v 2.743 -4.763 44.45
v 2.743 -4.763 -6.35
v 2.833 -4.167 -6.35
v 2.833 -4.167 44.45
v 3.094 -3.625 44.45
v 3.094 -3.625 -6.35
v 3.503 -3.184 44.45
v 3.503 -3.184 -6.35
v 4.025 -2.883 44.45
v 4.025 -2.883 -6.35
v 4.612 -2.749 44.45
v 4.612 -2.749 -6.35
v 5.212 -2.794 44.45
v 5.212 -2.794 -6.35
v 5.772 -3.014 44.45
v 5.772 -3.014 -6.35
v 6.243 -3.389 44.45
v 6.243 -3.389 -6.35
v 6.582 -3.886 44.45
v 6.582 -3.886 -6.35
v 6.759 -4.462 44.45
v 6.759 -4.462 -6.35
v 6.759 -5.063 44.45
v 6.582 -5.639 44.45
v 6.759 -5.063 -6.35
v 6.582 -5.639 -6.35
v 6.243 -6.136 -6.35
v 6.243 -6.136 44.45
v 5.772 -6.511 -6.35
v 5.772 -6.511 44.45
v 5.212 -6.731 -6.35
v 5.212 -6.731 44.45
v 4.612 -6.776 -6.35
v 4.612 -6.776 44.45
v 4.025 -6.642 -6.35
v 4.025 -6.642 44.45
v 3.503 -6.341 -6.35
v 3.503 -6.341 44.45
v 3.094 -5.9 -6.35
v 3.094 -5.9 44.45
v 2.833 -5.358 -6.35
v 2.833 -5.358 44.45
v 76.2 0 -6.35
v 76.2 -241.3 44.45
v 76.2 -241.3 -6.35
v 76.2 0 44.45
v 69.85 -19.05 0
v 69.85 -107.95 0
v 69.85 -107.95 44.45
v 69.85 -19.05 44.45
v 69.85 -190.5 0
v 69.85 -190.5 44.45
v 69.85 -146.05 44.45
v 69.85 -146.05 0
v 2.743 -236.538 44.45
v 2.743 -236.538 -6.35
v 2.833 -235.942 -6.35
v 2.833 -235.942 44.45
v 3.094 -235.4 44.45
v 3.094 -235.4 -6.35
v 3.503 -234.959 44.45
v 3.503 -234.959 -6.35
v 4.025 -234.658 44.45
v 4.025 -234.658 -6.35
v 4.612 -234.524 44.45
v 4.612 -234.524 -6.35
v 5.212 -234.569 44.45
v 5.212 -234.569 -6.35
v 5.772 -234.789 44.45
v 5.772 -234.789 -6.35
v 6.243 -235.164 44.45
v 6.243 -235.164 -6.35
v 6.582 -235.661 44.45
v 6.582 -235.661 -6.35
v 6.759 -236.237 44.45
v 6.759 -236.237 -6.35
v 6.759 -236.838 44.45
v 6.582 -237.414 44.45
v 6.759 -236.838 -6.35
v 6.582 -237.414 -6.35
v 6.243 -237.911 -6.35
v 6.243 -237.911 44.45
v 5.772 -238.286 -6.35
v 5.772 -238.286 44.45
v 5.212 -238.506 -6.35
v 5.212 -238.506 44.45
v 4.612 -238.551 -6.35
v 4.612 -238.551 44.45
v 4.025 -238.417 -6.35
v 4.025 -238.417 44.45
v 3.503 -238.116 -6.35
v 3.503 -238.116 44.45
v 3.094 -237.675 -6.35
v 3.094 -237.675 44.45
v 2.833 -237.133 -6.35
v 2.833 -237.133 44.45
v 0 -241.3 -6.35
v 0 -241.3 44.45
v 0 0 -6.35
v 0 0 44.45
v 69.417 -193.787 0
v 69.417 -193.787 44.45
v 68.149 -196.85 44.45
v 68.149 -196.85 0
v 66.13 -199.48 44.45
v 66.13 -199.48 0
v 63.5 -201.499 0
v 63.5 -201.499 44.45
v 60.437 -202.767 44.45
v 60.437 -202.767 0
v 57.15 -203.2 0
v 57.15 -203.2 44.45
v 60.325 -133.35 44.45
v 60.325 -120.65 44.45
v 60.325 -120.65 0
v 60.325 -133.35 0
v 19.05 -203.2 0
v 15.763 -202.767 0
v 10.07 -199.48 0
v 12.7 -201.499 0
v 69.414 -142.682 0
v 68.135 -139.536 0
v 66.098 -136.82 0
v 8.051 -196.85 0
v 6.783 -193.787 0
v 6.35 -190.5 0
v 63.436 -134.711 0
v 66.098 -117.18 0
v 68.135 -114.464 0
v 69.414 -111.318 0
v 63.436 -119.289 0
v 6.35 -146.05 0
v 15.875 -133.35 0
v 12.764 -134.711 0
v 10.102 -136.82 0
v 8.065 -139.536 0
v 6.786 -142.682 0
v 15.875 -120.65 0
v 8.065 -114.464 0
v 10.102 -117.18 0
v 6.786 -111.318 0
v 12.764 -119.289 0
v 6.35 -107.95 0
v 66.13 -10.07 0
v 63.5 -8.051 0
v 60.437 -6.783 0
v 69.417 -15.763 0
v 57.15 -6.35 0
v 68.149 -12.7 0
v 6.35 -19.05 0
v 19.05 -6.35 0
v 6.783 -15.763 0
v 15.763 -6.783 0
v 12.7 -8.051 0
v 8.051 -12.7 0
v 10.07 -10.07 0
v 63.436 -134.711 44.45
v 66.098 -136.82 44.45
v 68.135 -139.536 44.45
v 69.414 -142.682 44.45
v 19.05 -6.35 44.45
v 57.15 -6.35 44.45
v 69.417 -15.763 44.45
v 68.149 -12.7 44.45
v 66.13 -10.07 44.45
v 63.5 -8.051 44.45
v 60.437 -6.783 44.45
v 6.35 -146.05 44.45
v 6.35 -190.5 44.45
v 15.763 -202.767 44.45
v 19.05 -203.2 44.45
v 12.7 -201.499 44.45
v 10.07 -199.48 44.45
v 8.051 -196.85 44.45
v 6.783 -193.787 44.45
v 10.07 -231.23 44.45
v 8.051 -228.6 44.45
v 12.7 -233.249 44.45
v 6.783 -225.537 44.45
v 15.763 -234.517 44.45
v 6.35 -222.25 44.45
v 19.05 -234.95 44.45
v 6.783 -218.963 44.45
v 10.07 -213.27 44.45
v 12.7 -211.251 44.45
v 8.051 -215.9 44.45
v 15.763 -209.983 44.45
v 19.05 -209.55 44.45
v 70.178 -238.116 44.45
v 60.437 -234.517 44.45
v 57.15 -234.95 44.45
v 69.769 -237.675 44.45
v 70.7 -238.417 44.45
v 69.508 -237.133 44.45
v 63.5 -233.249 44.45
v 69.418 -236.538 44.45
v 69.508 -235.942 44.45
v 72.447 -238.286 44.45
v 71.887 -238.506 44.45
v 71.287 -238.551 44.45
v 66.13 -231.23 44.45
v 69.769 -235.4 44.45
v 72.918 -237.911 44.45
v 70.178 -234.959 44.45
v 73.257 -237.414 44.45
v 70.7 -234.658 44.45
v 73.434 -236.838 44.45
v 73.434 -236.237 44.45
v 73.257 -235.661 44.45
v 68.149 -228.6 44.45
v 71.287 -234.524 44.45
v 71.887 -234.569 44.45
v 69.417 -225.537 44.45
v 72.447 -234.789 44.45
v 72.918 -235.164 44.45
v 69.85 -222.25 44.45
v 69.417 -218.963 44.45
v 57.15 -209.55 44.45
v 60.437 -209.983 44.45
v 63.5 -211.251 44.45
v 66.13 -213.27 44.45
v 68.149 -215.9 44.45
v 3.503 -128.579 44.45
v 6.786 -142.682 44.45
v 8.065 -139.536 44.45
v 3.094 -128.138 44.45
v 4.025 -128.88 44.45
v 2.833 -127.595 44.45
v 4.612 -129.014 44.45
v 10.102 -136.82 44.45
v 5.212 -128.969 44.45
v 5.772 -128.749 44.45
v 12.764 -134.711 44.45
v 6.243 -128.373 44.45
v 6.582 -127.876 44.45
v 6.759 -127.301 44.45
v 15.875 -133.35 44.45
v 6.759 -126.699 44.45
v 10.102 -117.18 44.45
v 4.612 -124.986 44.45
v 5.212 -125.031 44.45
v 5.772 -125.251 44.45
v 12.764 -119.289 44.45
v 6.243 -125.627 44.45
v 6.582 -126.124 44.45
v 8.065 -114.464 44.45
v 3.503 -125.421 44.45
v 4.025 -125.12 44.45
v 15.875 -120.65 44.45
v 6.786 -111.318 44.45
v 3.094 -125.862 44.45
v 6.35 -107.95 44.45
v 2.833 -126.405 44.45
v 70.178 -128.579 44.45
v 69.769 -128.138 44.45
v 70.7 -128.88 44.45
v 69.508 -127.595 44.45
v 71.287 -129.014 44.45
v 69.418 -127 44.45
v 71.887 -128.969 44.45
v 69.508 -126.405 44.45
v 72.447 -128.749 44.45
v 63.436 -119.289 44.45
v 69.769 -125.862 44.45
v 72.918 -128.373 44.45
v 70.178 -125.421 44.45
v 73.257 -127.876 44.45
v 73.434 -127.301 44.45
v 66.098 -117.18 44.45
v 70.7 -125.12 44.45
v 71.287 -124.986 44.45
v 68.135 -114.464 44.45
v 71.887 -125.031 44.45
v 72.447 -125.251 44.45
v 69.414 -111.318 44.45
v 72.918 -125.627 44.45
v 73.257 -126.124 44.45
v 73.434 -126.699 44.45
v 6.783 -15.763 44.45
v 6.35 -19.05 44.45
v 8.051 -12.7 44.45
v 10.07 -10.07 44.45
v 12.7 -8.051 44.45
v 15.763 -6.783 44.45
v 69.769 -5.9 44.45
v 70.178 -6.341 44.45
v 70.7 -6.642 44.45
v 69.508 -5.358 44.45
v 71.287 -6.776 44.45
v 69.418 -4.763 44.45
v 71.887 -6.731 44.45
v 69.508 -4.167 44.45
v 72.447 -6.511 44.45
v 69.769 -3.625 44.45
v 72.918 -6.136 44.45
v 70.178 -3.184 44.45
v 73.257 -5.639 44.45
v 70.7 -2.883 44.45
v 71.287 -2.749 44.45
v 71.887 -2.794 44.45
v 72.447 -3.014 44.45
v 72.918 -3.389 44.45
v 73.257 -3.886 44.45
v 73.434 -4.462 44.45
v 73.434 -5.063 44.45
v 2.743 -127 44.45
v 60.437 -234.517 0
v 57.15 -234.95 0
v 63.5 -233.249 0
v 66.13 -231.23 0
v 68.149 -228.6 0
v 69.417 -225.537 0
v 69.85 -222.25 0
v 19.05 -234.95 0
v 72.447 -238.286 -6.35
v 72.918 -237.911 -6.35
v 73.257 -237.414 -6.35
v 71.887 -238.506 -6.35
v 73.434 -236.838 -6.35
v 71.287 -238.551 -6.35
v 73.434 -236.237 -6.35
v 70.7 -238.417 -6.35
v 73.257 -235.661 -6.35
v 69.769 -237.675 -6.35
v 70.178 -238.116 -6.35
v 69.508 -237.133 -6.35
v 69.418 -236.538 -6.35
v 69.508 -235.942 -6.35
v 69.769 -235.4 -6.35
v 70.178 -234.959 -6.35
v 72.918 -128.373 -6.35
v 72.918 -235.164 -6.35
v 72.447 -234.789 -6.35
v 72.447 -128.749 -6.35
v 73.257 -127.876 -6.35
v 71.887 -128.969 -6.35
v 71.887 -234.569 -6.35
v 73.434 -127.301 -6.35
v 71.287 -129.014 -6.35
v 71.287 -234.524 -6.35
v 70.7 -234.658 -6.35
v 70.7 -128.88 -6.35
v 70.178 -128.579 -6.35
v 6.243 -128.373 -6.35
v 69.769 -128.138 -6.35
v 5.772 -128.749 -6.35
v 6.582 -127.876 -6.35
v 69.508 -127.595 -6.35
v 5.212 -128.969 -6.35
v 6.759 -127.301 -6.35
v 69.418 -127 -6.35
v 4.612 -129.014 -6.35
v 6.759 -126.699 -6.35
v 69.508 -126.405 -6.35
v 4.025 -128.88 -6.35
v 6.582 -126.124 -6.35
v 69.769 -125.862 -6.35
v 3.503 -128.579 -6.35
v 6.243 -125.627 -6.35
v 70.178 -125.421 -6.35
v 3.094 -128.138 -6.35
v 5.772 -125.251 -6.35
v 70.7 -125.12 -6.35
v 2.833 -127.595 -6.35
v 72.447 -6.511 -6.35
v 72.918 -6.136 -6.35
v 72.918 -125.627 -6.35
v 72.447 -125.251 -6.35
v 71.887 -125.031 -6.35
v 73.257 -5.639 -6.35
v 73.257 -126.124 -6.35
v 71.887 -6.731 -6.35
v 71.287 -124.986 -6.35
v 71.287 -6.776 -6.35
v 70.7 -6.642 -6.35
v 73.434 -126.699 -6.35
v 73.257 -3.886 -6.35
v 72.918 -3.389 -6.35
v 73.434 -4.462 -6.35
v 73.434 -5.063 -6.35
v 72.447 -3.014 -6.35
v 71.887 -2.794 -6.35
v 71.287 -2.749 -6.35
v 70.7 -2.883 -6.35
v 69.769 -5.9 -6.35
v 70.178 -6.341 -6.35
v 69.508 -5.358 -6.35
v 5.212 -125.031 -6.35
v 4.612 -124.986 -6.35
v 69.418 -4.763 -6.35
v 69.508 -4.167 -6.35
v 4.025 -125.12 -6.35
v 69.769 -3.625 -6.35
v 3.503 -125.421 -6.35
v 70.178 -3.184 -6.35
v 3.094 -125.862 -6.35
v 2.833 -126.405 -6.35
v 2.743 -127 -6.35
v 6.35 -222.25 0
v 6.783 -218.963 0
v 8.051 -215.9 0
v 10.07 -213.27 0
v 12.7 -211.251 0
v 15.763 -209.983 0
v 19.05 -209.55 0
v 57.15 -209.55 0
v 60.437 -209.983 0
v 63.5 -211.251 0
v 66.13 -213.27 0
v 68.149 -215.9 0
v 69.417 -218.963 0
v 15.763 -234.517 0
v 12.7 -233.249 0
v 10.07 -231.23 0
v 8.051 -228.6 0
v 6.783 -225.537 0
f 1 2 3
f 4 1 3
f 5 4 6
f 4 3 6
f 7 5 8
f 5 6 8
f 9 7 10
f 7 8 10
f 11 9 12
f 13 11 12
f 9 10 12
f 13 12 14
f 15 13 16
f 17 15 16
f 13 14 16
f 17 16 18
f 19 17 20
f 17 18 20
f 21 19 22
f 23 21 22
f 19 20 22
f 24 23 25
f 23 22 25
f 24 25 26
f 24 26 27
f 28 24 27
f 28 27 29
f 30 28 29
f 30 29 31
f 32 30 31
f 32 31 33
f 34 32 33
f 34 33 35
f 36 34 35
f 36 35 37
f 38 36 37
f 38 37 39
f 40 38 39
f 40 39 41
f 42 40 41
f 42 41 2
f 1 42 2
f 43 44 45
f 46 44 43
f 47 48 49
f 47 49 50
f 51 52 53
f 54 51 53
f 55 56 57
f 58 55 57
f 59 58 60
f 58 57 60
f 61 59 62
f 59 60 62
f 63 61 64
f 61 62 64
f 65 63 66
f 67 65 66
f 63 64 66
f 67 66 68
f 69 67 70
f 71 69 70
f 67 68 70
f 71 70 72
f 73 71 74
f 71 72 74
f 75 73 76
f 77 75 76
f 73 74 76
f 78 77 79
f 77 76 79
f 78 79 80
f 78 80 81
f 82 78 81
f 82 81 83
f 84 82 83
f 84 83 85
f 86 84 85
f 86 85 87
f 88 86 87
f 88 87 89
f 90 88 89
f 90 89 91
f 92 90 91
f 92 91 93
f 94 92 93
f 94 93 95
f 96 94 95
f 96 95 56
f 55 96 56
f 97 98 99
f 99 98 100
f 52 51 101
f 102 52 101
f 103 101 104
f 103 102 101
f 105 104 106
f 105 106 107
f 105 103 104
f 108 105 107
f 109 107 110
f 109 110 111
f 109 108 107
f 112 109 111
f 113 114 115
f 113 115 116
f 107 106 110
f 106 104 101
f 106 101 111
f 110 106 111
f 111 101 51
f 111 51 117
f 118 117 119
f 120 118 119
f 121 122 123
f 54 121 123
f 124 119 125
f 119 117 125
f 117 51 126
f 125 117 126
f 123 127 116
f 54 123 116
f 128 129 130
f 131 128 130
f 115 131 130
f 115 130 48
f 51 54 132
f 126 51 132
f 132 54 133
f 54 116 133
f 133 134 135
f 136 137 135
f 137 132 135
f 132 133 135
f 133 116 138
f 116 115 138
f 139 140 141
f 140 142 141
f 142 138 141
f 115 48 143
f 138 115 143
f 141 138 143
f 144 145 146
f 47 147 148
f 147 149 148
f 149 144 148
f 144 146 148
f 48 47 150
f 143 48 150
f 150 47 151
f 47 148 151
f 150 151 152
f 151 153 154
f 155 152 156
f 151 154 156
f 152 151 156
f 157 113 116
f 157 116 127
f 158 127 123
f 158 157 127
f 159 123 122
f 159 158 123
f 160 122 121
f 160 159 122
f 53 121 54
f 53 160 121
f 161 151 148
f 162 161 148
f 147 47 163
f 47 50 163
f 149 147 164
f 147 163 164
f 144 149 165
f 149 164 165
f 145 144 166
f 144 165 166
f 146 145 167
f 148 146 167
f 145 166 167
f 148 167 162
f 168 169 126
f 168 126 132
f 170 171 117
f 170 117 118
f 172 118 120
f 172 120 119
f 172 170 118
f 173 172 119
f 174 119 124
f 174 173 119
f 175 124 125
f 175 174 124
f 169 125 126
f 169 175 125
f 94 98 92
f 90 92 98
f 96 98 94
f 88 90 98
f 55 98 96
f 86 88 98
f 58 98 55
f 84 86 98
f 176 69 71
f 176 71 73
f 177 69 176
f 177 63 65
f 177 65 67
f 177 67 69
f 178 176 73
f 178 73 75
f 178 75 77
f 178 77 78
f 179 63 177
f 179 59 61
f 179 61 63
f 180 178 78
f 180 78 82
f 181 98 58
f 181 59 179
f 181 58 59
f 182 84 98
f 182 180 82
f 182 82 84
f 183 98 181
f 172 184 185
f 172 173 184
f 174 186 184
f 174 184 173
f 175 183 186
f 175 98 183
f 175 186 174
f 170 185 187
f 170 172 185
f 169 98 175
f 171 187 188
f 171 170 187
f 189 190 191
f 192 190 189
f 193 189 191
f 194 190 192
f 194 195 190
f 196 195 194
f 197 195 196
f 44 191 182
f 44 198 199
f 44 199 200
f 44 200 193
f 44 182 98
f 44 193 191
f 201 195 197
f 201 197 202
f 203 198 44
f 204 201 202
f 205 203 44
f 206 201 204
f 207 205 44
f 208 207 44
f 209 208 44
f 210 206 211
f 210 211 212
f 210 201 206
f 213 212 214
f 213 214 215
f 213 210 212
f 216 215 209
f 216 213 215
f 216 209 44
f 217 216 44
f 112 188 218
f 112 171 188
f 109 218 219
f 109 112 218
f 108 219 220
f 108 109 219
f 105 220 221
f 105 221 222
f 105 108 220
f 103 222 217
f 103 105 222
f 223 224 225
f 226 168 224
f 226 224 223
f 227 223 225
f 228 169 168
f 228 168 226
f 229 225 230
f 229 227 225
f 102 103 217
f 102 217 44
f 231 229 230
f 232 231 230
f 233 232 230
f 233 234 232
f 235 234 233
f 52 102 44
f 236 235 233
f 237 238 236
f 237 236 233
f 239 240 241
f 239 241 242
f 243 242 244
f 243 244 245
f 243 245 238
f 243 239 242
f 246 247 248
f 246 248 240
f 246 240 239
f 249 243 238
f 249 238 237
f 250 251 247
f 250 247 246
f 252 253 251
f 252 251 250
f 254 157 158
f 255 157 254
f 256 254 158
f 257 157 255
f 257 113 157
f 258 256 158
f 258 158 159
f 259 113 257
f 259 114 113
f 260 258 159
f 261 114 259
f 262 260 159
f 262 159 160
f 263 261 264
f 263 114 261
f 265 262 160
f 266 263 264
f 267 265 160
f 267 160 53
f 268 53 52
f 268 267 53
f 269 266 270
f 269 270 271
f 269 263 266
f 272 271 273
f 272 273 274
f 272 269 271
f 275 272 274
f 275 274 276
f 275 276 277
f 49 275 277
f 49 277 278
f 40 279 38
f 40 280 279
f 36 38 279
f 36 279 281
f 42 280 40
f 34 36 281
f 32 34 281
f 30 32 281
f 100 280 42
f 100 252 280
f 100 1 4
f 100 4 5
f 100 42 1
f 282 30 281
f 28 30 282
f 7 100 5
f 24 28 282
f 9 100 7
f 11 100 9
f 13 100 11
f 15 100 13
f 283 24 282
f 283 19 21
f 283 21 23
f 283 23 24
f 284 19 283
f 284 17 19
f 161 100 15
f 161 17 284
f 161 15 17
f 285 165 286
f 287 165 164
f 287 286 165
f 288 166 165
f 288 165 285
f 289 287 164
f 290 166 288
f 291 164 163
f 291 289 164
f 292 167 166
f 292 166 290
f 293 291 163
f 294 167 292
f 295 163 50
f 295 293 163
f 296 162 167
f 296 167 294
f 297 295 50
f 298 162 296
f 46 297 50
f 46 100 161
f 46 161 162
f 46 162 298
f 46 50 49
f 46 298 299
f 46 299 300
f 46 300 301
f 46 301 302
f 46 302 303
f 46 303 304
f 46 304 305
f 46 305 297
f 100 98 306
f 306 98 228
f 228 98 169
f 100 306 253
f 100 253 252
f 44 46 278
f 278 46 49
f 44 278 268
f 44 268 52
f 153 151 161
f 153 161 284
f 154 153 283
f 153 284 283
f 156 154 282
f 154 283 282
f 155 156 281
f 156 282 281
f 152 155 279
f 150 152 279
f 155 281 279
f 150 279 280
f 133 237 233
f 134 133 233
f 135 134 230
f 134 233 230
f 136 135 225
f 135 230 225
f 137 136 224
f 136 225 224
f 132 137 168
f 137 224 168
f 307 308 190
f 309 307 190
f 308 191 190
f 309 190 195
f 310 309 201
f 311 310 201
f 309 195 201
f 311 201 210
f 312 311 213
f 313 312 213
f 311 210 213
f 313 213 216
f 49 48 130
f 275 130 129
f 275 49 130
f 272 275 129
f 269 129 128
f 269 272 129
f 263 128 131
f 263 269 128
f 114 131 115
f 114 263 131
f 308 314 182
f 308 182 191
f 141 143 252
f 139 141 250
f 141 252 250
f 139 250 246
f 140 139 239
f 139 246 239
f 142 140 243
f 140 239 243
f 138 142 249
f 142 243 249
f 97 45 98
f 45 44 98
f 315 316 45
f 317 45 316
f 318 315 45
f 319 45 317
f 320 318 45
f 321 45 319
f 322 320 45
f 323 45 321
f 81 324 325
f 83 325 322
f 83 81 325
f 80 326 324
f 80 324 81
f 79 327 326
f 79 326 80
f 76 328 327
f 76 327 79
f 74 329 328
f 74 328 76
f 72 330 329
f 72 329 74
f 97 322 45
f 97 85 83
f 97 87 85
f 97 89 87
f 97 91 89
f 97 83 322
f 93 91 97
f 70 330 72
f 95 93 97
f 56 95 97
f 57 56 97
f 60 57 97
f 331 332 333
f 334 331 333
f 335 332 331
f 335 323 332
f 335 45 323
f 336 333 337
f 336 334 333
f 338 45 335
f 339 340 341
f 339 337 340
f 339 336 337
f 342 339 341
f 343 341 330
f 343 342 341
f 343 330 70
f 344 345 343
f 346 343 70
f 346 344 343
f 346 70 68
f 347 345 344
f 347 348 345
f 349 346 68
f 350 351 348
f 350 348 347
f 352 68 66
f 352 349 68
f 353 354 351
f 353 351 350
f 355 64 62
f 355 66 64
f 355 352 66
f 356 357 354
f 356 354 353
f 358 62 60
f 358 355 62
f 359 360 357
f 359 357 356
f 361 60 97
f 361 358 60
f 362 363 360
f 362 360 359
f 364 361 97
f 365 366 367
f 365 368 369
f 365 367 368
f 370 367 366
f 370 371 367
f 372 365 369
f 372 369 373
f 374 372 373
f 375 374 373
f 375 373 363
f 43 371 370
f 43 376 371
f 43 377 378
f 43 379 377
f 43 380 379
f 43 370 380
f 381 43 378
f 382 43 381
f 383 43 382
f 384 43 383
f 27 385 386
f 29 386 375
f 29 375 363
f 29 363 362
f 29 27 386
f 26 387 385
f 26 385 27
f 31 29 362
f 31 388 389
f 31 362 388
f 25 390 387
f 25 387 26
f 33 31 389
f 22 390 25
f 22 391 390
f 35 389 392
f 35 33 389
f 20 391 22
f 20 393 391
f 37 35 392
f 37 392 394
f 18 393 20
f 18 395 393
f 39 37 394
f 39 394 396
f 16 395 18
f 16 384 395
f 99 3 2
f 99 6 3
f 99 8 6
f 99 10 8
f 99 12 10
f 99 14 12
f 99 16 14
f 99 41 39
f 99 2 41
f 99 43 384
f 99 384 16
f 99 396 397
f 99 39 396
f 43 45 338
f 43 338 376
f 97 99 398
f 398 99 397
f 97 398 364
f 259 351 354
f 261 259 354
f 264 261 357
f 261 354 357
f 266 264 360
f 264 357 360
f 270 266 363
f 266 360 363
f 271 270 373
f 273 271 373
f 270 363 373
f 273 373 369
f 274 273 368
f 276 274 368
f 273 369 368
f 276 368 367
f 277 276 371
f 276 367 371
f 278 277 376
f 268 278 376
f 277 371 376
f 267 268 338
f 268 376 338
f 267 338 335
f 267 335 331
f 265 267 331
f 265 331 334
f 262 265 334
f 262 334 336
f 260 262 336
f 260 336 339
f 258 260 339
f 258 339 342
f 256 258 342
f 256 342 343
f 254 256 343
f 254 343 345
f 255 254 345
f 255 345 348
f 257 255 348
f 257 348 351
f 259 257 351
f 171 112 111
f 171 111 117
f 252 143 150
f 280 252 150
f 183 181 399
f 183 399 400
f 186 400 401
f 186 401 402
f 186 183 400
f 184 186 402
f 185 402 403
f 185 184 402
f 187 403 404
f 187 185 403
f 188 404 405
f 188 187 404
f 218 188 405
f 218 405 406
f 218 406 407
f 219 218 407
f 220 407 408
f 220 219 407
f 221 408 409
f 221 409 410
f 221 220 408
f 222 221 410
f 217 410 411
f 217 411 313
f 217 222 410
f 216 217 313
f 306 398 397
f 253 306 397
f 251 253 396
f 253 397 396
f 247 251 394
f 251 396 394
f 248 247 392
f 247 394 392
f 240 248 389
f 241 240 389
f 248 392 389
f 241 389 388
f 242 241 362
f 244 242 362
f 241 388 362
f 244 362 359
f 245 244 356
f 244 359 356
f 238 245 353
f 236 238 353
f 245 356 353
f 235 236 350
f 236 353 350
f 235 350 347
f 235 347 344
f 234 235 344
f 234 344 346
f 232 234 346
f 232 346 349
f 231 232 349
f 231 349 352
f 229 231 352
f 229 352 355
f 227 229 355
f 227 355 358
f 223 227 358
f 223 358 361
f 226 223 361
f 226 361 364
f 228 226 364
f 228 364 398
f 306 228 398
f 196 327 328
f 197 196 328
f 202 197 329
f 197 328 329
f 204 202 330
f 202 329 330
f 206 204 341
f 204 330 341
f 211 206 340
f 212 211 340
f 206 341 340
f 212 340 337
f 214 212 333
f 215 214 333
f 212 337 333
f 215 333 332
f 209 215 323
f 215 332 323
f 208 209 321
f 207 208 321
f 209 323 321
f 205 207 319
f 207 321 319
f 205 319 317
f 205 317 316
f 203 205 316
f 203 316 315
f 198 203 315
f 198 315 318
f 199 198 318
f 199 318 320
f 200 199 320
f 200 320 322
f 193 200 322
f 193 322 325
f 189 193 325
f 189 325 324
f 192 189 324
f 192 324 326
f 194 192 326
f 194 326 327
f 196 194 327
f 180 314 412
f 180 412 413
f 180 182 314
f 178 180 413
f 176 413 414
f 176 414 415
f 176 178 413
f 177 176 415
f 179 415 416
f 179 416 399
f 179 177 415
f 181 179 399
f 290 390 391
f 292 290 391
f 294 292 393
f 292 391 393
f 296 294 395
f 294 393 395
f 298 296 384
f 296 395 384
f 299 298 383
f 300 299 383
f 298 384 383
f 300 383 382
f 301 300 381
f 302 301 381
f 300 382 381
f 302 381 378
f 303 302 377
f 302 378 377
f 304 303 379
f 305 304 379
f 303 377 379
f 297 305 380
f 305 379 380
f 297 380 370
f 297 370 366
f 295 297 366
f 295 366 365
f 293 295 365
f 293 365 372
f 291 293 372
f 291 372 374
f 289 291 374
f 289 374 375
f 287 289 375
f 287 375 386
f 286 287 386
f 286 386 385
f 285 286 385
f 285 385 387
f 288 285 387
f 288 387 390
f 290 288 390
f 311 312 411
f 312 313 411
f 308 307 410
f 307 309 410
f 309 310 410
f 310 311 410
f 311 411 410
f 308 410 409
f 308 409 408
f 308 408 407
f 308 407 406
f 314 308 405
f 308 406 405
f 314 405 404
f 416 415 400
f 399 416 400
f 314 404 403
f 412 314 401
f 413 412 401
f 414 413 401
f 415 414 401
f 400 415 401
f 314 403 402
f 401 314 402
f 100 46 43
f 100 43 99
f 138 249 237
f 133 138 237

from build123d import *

# Parameters (mm, degrees)
SKETCH1_W              = 76.2
SKETCH1_H              = 241.3
SKETCH1_W_2            = 63.5
SKETCH1_H_2            = 228.6
BOSS_EXTRUDE1_DEPTH    = 44.45
FILLET1_R              = 12.7
SKETCH2_W              = 76.2
SKETCH2_H              = 241.3
BOSS_EXTRUDE2_DEPTH    = 6.35
BOSS_EXTRUDE3_DEPTH    = 44.45
F_10_32_TAPPED_HOLE1_D = 4.0386
BOSS_EXTRUDE4_DEPTH    = 44.45


with BuildPart() as part:
    # Sketch1 → Boss-Extrude1 (new body)
    with BuildSketch(Plane.XY):
        with Locations((38.1, -120.65)):
            Rectangle(SKETCH1_W, SKETCH1_H)
        with Locations((38.1, -120.65)):
            Rectangle(SKETCH1_W_2, SKETCH1_H_2, mode=Mode.SUBTRACT)
    extrude(amount=BOSS_EXTRUDE1_DEPTH)

    # Fillet1
    fillet1_edges = [part.edges().sort_by_distance(p)[0] for p in [
        (6.35, -6.35, 22.225),
        (6.35, -234.95, 22.225),
        (69.85, -234.95, 22.225),
        (69.85, -6.35, 22.225),
    ]]
    fillet(fillet1_edges, radius=FILLET1_R)

    # Sketch2 → Boss-Extrude2 (add)
    with BuildSketch(Plane(origin=(0, 0, 0), x_dir=(-1, 0, 0), z_dir=(0, 0, -1))):
        with Locations((-38.1, -120.65)):
            Rectangle(SKETCH2_W, SKETCH2_H)
    extrude(amount=BOSS_EXTRUDE2_DEPTH)

    # Sketch3 → Boss-Extrude3 (add)
    with BuildSketch(Plane.XY.offset(44.45)):
        with BuildLine():
            Line((60.325, -120.65), (60.325, -133.35))
            ThreePointArc((60.325, -133.35), (67.204166667, -138.1125), (69.85, -146.05))
            Line((69.85, -146.05), (69.85, -107.95))
            ThreePointArc((69.85, -107.95), (67.204166667, -115.8875), (60.325, -120.65))
        make_face()
    boss_extrude3 = extrude(amount=-BOSS_EXTRUDE3_DEPTH)

    # Mirror1: Boss-Extrude3 across plane
    add(boss_extrude3.mirror(Plane.ZY.offset(-38.1)))

    # #10-32 Tapped Hole1 (through all)
    with Locations(Plane.XY.offset(44.45)):
        with Locations((4.7625, -4.7625), (71.4375, -4.7625), (71.4375, -127), (4.7625, -127), (4.7625, -236.5375), (71.4375, -236.5375)):
            Hole(F_10_32_TAPPED_HOLE1_D / 2)

    # Sketch8 → Boss-Extrude4 (add)
    with BuildSketch(Plane.XY.offset(44.45)):
        with BuildLine():
            Line((19.05, -209.55), (57.15, -209.55))
            ThreePointArc((57.15, -209.55), (66.130256121, -213.269743879), (69.85, -222.25))
            Line((69.85, -222.25), (69.85, -190.5))
            ThreePointArc((69.85, -190.5), (66.130256121, -199.480256121), (57.15, -203.2))
            Line((57.15, -203.2), (19.05, -203.2))
            ThreePointArc((19.05, -203.2), (10.069743879, -199.480256121), (6.35, -190.5))
            Line((6.35, -190.5), (6.35, -222.25))
            ThreePointArc((6.35, -222.25), (10.069743879, -213.269743879), (19.05, -209.55))
        make_face()
    extrude(amount=-BOSS_EXTRUDE4_DEPTH)


solid = part.part
